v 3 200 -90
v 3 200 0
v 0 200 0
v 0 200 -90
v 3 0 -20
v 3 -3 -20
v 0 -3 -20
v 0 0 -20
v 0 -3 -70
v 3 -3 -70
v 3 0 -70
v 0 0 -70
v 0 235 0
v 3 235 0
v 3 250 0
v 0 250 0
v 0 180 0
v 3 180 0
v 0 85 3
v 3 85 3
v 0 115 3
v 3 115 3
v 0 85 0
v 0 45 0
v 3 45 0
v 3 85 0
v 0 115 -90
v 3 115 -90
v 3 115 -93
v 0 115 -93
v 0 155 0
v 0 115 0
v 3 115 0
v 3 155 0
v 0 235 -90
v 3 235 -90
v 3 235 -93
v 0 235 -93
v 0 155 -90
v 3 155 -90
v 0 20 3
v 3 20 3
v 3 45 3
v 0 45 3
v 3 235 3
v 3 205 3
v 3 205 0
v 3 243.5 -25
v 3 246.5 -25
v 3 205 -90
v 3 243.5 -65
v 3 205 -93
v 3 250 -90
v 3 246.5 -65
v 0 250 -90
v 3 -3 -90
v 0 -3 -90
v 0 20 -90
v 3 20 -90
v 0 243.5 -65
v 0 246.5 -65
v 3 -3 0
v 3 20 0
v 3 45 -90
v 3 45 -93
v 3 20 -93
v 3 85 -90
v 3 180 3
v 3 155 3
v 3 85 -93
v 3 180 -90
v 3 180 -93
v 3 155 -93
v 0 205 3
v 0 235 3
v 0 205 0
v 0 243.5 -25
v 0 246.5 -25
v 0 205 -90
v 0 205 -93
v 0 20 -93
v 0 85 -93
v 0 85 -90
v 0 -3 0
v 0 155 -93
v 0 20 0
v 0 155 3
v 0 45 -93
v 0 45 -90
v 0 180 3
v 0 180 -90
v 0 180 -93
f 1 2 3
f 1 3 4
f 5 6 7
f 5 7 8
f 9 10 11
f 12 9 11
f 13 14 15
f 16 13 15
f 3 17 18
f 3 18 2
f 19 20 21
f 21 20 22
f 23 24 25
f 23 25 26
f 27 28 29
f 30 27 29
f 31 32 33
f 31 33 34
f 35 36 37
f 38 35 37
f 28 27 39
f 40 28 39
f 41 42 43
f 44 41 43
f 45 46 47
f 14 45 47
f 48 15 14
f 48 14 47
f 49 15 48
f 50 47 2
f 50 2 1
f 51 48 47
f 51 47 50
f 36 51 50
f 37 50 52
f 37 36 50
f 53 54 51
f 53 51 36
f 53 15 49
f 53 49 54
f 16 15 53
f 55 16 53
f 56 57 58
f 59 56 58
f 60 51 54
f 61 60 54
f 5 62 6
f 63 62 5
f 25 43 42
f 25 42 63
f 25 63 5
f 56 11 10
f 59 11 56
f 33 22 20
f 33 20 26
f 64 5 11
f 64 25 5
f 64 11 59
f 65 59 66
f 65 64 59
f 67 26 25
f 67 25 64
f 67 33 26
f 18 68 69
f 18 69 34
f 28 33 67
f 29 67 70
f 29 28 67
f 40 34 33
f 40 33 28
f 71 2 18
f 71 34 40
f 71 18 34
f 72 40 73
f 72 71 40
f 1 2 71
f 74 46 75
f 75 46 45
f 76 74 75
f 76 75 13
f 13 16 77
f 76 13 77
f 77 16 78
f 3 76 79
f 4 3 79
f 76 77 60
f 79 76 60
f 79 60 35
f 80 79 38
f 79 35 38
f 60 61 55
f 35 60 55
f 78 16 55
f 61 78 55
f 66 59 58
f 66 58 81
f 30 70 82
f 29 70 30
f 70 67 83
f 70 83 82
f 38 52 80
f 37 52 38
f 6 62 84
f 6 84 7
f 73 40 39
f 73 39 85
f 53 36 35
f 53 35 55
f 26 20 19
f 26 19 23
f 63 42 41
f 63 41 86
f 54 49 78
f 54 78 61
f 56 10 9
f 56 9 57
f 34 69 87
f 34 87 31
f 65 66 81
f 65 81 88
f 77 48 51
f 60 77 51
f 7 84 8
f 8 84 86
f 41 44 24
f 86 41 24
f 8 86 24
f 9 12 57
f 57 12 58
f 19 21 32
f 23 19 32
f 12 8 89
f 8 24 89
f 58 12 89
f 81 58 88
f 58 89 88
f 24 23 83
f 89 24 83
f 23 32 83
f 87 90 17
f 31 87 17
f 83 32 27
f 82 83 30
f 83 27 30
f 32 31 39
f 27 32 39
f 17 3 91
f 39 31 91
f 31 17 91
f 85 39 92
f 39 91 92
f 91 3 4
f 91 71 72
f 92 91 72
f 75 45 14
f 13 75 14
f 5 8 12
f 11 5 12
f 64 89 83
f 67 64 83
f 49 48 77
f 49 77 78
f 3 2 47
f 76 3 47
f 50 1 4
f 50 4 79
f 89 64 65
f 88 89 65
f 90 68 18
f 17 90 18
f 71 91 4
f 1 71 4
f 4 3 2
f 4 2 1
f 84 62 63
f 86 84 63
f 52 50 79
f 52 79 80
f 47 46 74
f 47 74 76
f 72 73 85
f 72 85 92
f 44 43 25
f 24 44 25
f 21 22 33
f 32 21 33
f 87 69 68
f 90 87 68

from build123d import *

# Parameters (mm, degrees)
SKETCH1_W           = 90
SKETCH1_H           = 200
BOSS_EXTRUDE1_DEPTH = 3
SKETCH4_W           = 3
SKETCH4_H           = 25
SKETCH4_H_2         = 30
BOSS_EXTRUDE3_DEPTH = 3
SKETCH5_W           = 20
SKETCH5_H           = 3
BOSS_EXTRUDE4_DEPTH = 3
SKETCH6_W           = 90
SKETCH6_H           = 50
BOSS_EXTRUDE5_DEPTH = 3
SKETCH7_W           = 40
SKETCH7_H           = 3
CUT_EXTRUDE2_DEPTH  = 3
SKETCH8_W           = 3
SKETCH8_H           = 30
BOSS_EXTRUDE6_DEPTH = 3


with BuildPart() as part:
    # Sketch1 → Boss-Extrude1 (new body)
    with BuildSketch(Plane(origin=(0, 0, 0), x_dir=(0, 0, -1), z_dir=(1, 0, 0))):
        with Locations((45, 100)):
            Rectangle(SKETCH1_W, SKETCH1_H)
    extrude(amount=BOSS_EXTRUDE1_DEPTH)

    # Sketch4 → Boss-Extrude3 (add, through all)
    with BuildSketch(Plane(origin=(3, 0, 0), x_dir=(0, 0, -1), z_dir=(1, 0, 0))):
        with Locations((-1.5, 167.5)):
            Rectangle(SKETCH4_W, SKETCH4_H)
        with Locations((-1.5, 100)):
            Rectangle(SKETCH4_W, SKETCH4_H_2)
        with Locations((-1.5, 32.5)):
            Rectangle(SKETCH4_W, SKETCH4_H)
        with Locations((91.5, 32.5)):
            Rectangle(SKETCH4_W, SKETCH4_H)
        with Locations((91.5, 100)):
            Rectangle(SKETCH4_W, SKETCH4_H_2)
        with Locations((91.5, 167.5)):
            Rectangle(SKETCH4_W, SKETCH4_H)
    extrude(amount=-BOSS_EXTRUDE3_DEPTH)

    # Sketch5 → Boss-Extrude4 (add, through all)
    with BuildSketch(Plane(origin=(3, 0, 0), x_dir=(0, 0, -1), z_dir=(1, 0, 0))):
        with Locations((10, -1.5)):
            Rectangle(SKETCH5_W, SKETCH5_H)
        with Locations((80, -1.5)):
            Rectangle(SKETCH5_W, SKETCH5_H)
    extrude(amount=-BOSS_EXTRUDE4_DEPTH)


with BuildPart() as body_2:
    # Sketch6 → Boss-Extrude5 (new body)
    with BuildSketch(Plane(origin=(3, 0, 0), x_dir=(0, 0, -1), z_dir=(1, 0, 0))):
        with Locations((45, 225)):
            Rectangle(SKETCH6_W, SKETCH6_H)
    extrude(amount=-BOSS_EXTRUDE5_DEPTH)

    # Sketch7 → Cut-Extrude2 (cut)
    with BuildSketch(Plane(origin=(3, 0, 0), x_dir=(0, 0, -1), z_dir=(1, 0, 0))):
        with Locations((45, 245)):
            Rectangle(SKETCH7_W, SKETCH7_H)
    extrude(amount=-CUT_EXTRUDE2_DEPTH, mode=Mode.SUBTRACT)

    # Sketch8 → Boss-Extrude6 (add)
    with BuildSketch(Plane(origin=(3, 0, 0), x_dir=(0, 0, -1), z_dir=(1, 0, 0))):
        with Locations((-1.5, 220)):
            Rectangle(SKETCH8_W, SKETCH8_H)
        with Locations((91.5, 220)):
            Rectangle(SKETCH8_W, SKETCH8_H)
    extrude(amount=-BOSS_EXTRUDE6_DEPTH)


solid = Compound([part.part, body_2.part])
